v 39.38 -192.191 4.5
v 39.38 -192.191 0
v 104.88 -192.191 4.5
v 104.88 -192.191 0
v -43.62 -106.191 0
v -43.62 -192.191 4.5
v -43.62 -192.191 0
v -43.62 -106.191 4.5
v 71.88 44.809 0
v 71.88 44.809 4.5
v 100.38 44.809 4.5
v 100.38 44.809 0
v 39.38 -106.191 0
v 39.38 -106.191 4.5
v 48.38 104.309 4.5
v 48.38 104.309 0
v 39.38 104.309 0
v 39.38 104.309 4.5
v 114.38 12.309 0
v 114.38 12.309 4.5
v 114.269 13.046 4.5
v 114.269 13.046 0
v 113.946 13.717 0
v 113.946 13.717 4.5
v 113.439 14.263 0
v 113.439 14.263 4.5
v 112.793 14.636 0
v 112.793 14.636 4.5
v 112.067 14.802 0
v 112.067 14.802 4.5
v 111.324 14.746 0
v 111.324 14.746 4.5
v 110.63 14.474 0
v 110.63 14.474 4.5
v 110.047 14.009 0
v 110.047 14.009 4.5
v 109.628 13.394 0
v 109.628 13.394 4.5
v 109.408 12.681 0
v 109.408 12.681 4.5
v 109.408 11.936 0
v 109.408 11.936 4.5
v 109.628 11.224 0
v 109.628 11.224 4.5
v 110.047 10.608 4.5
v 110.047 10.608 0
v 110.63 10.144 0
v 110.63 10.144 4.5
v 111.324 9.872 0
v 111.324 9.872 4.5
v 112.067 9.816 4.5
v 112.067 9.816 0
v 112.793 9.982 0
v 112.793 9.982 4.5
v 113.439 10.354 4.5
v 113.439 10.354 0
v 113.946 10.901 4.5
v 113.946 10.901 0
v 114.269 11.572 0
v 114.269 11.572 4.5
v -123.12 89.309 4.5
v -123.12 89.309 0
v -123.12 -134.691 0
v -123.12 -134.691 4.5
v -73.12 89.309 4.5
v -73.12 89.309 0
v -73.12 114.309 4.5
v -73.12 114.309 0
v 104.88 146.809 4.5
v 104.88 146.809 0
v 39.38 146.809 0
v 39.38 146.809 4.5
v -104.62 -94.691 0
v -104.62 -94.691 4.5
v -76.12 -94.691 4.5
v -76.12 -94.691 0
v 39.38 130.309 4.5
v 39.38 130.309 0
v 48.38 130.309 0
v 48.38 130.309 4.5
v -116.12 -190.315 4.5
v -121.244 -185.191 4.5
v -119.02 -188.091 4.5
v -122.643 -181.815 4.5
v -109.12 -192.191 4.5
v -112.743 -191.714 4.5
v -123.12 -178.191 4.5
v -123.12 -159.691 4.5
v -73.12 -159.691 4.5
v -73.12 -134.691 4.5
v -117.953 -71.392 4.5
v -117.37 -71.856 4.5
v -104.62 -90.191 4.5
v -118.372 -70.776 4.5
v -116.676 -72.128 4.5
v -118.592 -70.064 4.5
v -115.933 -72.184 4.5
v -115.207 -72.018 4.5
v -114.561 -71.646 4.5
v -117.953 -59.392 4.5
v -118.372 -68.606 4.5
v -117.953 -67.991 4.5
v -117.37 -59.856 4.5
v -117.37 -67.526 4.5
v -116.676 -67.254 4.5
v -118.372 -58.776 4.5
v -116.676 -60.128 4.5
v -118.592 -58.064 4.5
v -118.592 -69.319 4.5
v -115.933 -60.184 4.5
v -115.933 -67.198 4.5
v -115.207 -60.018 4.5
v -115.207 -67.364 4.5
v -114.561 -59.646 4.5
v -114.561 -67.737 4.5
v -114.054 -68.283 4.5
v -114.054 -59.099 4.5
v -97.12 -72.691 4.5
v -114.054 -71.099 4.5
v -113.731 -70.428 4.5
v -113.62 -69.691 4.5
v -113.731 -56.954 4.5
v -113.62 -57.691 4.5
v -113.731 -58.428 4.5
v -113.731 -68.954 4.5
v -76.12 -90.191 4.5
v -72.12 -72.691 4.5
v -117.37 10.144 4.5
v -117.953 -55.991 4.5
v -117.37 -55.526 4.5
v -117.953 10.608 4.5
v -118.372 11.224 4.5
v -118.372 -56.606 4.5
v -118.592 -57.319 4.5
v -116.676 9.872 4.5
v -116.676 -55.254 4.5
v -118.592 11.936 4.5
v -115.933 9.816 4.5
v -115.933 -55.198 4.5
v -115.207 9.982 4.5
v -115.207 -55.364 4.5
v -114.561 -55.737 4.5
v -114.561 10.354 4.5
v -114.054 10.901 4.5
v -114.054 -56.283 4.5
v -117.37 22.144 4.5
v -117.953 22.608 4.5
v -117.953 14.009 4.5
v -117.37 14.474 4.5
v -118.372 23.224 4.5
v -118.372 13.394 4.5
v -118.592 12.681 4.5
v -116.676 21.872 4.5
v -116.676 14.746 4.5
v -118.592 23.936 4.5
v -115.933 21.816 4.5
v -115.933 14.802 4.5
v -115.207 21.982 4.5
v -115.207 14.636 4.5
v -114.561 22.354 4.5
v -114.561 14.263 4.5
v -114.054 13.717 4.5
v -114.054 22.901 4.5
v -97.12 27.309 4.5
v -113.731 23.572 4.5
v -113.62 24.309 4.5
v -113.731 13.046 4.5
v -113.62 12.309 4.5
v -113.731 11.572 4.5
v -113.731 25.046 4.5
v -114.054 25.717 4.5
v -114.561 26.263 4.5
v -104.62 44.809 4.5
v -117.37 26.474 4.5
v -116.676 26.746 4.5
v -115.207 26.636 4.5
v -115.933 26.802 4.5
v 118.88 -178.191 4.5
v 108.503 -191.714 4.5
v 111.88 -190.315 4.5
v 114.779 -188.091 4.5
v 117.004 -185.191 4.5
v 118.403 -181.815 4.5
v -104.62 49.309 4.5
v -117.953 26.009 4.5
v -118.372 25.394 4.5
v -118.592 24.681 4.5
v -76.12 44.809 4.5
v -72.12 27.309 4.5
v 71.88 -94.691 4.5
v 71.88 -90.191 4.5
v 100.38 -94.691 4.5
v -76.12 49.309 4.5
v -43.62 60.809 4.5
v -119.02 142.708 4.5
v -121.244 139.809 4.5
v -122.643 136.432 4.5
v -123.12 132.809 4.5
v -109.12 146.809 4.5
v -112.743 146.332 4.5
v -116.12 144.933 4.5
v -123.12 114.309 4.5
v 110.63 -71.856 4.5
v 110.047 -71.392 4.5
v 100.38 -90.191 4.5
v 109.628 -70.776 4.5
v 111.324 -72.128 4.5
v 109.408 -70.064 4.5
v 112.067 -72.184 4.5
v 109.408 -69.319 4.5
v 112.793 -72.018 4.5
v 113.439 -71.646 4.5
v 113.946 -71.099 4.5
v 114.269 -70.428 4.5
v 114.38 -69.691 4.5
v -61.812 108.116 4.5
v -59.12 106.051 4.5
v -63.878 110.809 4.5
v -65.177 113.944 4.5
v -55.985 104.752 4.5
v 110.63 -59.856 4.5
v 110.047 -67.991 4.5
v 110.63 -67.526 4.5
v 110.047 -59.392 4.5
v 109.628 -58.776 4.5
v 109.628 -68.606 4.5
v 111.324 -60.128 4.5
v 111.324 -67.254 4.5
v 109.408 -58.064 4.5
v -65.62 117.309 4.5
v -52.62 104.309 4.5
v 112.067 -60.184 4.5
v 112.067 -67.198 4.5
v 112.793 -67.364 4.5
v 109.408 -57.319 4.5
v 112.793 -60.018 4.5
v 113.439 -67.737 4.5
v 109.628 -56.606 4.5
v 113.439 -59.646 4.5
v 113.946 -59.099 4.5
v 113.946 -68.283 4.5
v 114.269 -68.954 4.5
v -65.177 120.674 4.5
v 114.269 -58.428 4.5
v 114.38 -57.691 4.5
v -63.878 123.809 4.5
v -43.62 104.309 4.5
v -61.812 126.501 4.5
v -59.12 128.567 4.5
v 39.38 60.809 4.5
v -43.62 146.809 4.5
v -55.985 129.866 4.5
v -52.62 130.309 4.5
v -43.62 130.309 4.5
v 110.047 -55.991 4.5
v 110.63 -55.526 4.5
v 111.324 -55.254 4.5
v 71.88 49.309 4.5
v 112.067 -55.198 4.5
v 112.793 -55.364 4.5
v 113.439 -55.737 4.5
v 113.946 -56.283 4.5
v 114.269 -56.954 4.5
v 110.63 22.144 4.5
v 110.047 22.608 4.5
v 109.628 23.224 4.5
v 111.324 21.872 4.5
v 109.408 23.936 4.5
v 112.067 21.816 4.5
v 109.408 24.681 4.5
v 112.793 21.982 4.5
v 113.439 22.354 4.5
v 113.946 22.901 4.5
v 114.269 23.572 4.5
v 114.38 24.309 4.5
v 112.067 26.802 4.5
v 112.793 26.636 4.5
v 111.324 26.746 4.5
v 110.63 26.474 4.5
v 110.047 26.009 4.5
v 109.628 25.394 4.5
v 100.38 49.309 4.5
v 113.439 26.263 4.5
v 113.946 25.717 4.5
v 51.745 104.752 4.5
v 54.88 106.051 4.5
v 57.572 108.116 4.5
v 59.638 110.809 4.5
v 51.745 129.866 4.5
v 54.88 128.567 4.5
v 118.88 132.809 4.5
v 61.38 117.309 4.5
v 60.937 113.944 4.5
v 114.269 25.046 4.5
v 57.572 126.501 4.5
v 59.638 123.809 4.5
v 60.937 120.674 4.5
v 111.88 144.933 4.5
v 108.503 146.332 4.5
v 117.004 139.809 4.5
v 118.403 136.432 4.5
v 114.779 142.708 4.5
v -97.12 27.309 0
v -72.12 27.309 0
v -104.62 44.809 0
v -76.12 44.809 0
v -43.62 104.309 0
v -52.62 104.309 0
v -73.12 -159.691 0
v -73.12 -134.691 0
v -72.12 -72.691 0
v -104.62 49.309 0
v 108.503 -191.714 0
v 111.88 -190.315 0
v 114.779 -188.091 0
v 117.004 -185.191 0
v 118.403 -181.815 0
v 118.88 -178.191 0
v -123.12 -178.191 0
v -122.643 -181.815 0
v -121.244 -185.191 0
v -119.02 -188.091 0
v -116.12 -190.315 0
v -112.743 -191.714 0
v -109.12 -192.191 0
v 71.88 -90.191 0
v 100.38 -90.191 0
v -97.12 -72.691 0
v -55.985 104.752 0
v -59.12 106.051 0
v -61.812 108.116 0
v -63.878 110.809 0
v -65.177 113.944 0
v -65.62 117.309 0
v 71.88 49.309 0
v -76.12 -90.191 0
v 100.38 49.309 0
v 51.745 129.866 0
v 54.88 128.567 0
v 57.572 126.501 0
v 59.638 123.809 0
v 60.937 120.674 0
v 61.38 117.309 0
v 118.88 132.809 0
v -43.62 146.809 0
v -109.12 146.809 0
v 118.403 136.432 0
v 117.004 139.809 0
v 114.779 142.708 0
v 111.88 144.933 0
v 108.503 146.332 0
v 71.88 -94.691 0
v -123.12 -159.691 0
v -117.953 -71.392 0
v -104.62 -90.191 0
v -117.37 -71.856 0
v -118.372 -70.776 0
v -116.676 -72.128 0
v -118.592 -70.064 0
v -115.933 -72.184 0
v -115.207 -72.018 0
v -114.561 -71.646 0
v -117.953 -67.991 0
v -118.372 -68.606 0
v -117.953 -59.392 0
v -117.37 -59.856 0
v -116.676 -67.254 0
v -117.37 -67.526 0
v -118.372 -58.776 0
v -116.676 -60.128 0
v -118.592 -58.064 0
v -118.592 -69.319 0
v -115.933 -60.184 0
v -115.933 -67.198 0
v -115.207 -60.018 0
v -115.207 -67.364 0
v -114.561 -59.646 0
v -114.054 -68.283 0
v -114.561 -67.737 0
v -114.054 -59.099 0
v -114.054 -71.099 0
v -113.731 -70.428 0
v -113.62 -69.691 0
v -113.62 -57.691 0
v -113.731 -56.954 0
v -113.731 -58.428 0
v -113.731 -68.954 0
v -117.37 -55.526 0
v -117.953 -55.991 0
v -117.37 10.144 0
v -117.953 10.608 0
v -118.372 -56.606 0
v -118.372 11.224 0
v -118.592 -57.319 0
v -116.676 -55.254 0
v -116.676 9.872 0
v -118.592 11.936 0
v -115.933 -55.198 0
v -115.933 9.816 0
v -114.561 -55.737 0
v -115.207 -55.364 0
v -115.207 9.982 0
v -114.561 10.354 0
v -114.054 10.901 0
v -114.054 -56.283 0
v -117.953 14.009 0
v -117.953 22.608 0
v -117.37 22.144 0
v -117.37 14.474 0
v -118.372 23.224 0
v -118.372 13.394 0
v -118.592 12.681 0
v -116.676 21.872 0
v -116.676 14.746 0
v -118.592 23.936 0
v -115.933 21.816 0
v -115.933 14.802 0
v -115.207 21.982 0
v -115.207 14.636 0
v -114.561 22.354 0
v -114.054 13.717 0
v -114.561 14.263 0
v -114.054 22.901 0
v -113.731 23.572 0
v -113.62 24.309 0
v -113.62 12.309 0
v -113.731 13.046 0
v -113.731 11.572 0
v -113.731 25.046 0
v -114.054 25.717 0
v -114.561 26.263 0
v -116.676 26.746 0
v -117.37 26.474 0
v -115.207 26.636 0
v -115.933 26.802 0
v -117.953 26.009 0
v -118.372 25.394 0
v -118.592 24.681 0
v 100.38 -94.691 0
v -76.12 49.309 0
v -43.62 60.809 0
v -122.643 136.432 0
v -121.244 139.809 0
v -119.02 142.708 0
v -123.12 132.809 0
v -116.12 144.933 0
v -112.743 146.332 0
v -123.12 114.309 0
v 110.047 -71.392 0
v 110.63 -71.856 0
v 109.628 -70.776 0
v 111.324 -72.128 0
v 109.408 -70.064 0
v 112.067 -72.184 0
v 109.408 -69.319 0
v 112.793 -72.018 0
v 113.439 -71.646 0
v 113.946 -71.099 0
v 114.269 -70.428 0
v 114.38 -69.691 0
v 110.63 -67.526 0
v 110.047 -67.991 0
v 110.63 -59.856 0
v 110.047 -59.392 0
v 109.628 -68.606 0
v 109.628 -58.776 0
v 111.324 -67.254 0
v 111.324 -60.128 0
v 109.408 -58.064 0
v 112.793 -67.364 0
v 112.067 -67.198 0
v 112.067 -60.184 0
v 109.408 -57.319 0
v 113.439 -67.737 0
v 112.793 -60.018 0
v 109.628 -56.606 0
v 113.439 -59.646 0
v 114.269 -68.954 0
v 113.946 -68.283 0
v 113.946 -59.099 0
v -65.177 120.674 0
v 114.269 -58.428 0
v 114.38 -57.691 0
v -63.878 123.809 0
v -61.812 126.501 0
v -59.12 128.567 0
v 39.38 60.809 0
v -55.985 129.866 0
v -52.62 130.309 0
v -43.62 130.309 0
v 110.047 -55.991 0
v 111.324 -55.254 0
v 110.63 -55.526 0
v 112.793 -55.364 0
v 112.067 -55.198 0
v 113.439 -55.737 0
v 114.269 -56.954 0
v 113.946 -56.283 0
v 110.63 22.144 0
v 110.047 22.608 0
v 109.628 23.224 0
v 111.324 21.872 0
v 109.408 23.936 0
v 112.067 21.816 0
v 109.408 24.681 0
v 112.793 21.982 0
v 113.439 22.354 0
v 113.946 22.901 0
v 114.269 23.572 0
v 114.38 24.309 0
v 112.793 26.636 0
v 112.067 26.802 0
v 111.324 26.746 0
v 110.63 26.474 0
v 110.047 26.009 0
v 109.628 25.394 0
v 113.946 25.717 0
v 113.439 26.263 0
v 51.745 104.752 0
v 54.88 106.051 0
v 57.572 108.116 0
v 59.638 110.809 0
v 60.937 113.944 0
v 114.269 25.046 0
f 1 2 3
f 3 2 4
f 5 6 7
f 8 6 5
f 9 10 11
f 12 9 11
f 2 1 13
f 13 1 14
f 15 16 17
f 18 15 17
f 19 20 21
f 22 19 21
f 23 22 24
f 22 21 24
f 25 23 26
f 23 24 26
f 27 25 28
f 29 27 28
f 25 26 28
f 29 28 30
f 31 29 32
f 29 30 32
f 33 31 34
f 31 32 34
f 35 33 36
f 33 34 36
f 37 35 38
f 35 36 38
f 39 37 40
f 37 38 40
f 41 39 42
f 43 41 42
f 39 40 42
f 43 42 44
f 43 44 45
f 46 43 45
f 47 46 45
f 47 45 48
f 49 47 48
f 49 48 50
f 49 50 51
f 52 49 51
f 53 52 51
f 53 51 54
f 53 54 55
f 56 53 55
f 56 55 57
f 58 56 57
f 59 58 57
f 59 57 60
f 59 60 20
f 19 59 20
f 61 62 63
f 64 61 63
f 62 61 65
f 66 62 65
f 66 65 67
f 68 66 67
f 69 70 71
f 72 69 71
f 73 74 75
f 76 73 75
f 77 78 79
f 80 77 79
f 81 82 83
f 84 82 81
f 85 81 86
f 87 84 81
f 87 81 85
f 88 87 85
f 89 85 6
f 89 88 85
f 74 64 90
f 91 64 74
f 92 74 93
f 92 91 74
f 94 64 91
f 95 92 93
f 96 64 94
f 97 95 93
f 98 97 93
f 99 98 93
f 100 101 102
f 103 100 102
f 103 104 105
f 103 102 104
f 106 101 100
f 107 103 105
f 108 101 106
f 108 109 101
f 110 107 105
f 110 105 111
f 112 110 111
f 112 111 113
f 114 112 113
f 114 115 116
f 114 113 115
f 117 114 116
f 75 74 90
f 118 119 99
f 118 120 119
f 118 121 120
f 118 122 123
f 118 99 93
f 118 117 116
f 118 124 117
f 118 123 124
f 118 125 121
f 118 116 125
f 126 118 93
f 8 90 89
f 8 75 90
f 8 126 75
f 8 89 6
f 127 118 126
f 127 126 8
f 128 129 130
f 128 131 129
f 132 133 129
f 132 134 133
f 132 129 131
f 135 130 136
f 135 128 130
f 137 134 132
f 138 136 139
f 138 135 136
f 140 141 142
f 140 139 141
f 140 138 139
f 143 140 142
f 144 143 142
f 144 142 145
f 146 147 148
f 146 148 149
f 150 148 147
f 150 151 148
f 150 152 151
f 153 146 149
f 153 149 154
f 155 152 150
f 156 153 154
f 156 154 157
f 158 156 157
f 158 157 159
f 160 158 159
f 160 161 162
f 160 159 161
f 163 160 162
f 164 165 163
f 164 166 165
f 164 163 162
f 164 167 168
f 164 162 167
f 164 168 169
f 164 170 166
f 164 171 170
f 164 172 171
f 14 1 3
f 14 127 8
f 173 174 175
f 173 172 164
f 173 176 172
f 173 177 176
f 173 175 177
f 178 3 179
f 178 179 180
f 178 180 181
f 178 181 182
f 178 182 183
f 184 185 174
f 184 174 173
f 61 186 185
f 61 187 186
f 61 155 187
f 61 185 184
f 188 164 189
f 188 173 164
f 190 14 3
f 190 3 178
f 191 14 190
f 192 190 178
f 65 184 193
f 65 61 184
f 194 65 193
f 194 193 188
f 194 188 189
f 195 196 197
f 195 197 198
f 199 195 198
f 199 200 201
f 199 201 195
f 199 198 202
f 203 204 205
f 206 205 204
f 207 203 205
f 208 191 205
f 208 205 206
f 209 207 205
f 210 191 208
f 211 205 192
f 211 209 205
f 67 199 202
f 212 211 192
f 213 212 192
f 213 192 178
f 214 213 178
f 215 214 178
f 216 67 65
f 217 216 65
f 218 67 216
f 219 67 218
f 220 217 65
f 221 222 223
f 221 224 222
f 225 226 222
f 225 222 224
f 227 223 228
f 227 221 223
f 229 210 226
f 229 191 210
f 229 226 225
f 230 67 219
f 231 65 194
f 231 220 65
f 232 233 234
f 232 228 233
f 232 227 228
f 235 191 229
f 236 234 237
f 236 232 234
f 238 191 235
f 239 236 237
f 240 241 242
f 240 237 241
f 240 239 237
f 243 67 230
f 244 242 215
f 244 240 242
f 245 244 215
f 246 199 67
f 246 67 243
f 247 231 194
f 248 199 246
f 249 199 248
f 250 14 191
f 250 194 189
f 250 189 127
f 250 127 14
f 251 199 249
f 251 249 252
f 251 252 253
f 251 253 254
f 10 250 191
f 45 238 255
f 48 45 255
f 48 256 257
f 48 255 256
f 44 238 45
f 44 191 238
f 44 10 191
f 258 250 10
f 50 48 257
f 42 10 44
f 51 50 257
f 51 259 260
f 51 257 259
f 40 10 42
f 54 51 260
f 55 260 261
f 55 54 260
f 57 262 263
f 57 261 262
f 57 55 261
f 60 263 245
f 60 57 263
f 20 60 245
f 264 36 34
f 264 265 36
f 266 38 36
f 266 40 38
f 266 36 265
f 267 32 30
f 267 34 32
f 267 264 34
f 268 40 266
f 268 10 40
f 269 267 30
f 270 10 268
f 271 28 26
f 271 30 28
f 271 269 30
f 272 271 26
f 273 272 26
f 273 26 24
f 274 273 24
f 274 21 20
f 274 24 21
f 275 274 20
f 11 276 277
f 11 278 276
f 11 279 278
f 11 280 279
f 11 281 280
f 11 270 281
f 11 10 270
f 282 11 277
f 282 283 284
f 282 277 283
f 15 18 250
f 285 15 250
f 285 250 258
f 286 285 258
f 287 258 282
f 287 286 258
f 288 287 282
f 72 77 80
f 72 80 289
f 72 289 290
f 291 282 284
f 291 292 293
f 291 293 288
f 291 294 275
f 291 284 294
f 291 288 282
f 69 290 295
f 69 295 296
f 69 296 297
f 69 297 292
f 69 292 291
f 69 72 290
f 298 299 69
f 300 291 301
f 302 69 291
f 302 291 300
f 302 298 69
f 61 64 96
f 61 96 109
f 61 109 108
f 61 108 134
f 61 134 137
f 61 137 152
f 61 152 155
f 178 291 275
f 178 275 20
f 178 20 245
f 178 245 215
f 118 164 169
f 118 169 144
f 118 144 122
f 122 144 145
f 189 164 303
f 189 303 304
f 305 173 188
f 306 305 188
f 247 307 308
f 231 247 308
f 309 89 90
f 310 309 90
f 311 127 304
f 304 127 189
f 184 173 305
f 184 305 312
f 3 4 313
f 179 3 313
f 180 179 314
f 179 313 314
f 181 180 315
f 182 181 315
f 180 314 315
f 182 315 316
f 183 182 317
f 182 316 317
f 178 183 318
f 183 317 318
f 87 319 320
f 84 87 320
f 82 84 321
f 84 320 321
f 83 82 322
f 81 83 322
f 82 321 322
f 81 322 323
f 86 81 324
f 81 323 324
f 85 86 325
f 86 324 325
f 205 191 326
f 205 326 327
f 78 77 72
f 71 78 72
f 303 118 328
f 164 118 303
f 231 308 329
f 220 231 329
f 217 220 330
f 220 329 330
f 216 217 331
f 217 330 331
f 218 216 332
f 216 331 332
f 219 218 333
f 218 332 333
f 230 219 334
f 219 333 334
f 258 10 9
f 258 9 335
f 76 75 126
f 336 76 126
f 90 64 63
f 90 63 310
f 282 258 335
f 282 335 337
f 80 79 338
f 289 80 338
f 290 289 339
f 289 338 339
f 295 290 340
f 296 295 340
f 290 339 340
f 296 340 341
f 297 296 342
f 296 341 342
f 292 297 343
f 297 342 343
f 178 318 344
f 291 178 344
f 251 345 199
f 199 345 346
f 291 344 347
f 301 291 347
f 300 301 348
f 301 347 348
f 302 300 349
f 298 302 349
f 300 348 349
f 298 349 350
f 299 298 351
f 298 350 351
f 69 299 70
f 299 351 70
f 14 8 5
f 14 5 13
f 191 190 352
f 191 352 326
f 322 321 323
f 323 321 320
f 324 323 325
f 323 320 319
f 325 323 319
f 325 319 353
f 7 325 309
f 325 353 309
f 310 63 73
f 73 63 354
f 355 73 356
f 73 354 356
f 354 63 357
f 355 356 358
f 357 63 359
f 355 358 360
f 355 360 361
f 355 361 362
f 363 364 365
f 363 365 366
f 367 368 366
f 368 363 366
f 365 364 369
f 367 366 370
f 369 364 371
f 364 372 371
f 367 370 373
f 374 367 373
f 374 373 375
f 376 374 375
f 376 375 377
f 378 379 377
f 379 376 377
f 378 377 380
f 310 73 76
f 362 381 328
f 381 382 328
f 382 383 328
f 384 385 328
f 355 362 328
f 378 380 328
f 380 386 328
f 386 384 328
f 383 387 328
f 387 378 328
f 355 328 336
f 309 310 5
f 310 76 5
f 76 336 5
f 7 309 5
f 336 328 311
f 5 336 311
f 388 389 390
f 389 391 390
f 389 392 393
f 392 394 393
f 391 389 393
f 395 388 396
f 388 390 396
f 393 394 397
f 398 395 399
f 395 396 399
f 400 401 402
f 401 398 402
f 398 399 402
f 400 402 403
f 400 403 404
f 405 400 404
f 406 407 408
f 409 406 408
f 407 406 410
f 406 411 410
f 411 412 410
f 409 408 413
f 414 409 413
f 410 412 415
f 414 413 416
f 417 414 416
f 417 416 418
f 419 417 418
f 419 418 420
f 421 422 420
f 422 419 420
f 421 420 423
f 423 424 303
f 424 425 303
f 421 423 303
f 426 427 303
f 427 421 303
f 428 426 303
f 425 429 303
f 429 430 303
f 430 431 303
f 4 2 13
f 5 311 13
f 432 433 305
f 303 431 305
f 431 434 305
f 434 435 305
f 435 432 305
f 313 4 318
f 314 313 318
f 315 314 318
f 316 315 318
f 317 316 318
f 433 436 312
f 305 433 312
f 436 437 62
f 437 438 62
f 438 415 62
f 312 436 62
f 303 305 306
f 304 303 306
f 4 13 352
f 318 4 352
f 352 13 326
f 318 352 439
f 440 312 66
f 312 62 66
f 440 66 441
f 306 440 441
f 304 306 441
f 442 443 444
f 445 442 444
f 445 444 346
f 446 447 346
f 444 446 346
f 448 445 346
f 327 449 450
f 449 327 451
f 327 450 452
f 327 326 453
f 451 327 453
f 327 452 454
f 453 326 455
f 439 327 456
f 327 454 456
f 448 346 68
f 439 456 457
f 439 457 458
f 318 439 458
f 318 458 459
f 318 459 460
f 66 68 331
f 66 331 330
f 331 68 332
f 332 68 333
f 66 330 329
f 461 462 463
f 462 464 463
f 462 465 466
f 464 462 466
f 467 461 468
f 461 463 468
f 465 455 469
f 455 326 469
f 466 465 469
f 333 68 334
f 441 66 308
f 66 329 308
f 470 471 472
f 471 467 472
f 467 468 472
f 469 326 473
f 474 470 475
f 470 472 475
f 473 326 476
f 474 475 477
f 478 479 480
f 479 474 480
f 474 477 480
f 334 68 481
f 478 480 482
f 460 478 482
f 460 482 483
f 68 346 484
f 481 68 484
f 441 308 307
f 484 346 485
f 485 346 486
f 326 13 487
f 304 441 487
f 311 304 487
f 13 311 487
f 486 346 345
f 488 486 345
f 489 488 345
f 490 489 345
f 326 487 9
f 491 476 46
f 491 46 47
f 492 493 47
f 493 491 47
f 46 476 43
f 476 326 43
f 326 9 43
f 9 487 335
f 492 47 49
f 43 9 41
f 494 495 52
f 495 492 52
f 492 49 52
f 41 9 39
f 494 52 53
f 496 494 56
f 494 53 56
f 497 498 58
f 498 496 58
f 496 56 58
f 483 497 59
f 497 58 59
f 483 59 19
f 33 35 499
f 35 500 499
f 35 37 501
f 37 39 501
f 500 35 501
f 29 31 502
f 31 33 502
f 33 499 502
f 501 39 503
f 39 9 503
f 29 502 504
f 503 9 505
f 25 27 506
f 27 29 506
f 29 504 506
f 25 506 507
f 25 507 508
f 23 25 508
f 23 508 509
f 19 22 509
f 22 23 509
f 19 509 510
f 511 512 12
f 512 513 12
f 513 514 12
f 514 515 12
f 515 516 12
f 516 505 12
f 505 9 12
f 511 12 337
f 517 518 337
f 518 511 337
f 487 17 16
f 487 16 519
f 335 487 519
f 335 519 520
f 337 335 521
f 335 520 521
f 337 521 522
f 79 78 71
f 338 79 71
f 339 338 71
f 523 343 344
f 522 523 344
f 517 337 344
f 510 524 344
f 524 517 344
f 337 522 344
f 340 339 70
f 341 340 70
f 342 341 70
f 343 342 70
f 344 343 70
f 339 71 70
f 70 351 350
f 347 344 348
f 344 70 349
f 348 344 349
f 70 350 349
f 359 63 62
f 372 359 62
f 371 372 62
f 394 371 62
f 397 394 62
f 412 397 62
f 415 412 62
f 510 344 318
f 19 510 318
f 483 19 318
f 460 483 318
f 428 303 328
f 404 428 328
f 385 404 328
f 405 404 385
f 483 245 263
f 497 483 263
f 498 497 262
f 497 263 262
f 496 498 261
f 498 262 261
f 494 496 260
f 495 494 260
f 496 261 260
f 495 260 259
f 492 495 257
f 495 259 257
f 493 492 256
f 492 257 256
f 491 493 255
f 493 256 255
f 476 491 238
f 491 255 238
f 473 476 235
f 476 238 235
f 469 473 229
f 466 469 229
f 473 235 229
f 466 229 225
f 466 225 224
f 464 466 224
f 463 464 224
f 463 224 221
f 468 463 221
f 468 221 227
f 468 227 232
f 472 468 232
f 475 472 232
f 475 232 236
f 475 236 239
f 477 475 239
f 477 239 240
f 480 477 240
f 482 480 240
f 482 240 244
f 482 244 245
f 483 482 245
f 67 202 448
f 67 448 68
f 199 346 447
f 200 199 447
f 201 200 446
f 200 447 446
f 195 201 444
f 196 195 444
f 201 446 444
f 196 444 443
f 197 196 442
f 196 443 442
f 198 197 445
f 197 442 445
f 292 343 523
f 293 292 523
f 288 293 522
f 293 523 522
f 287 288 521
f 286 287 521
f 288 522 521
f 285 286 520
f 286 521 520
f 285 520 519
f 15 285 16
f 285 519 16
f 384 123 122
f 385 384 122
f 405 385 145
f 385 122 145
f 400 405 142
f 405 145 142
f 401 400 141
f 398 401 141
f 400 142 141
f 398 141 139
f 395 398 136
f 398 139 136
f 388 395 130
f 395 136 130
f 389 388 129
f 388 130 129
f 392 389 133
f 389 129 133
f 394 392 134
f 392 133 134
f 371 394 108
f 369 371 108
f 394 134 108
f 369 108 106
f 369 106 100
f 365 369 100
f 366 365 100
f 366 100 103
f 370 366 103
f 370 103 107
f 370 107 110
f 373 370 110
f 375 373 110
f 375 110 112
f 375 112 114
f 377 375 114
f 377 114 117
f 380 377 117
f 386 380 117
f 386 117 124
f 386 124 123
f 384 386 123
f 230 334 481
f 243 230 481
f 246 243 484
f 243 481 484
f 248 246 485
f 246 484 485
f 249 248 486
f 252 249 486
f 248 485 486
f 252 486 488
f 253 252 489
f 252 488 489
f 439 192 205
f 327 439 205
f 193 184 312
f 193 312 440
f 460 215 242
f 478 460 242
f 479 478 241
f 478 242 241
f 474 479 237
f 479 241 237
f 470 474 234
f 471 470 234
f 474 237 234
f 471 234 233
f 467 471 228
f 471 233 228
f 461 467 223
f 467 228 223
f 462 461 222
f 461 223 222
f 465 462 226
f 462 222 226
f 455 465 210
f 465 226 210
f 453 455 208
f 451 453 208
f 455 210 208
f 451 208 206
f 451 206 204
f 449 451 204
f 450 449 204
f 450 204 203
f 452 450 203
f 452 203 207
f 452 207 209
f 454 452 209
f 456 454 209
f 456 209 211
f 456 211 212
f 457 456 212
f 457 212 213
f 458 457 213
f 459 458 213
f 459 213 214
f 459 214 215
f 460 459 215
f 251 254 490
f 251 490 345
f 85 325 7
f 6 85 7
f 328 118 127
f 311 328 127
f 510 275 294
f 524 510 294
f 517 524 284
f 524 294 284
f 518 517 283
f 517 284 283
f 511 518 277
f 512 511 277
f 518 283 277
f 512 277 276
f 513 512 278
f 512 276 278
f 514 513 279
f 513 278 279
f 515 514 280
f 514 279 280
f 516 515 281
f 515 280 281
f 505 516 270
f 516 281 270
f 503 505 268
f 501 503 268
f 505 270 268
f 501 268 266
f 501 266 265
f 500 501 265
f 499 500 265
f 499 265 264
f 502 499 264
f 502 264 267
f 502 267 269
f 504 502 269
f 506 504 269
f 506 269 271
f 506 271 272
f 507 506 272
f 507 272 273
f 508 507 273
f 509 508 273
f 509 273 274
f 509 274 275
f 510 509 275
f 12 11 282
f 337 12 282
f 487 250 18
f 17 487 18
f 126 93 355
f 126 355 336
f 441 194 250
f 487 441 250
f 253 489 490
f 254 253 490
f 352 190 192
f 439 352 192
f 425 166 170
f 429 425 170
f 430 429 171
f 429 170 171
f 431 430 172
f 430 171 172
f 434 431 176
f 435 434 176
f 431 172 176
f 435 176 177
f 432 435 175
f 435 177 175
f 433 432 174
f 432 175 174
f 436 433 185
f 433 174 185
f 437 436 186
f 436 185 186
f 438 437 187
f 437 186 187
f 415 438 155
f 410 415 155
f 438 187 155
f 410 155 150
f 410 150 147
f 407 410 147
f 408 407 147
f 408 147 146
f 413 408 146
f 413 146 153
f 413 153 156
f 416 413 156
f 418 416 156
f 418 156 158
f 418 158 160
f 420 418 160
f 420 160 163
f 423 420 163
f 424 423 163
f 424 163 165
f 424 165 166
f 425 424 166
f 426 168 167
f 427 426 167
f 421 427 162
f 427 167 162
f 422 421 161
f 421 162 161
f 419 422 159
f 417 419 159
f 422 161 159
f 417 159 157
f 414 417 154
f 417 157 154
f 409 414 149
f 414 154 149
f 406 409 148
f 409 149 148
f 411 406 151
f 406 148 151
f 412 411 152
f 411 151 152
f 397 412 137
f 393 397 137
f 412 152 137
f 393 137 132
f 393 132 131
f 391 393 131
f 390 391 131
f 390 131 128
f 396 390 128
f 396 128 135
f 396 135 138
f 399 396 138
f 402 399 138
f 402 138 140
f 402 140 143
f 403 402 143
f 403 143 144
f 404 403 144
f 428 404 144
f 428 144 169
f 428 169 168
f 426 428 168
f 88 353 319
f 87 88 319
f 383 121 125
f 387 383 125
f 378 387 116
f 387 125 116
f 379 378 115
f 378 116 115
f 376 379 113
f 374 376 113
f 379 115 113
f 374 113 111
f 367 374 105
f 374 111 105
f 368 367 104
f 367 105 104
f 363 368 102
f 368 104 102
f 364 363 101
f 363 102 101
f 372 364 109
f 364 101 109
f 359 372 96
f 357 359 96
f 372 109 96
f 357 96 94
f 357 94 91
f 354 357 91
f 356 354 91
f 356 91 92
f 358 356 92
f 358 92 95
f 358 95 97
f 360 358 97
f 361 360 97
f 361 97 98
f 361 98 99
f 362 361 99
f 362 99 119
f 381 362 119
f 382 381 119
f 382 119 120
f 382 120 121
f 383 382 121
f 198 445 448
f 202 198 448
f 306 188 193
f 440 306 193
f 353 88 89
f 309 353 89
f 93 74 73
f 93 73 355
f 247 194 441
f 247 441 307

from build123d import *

# Parameters (mm, degrees)
F1_DEPTH = 4.5
F2_W     = 28.5
F2_H     = 4.5
F2_R     = 2.5
F2_W_2   = 25
F2_H_2   = 100
F2_W_3   = 50
F2_H_3   = 25
F2_W_4   = 83
F2_H_4   = 86
F3_DEPTH = 25


with BuildPart() as f1:
    # F0 (on Top) → F1 (new body)
    with BuildSketch(Plane.XY):
        with BuildLine():
            Line((104.879995, 146.808884), (-109.120005, 146.808884))
            ThreePointArc((-109.120005, 146.808884), (-119.0195, 142.708379), (-123.120005, 132.808884))
            Line((-123.120005, 132.808884), (-123.120005, -178.191116))
            ThreePointArc((-123.120005, -178.191116), (-119.0195, -188.090611), (-109.120005, -192.191116))
            Line((-109.120005, -192.191116), (104.879995, -192.191116))
            ThreePointArc((104.879995, -192.191116), (114.77949, -188.090611), (118.879995, -178.191116))
            Line((118.879995, -178.191116), (118.879995, 132.808884))
            ThreePointArc((118.879995, 132.808884), (114.77949, 142.708379), (104.879995, 146.808884))
        make_face()
        with BuildLine():
            ThreePointArc((-65.620005, 117.308884), (-61.812393, 126.501272), (-52.620005, 130.308884))
            Line((-52.620005, 130.308884), (48.379995, 130.308884))
            ThreePointArc((48.379995, 130.308884), (57.572383, 126.501272), (61.379995, 117.308884))
            ThreePointArc((61.379995, 117.308884), (57.572383, 108.116496), (48.379995, 104.308884))
            Line((48.379995, 104.308884), (-52.620005, 104.308884))
            ThreePointArc((-52.620005, 104.308884), (-61.812393, 108.116496), (-65.620005, 117.308884))
        make_face(mode=Mode.SUBTRACT)
    extrude(amount=F1_DEPTH)

    # F2 (on face) → F3 (cut)
    with BuildSketch(Plane.XY.offset(4.5)):
        with Locations((-90.370005, 47.058884)):
            Rectangle(F2_W, F2_H)
        with Locations((-116.120005, 24.308884)):
            Circle(F2_R)
        with Locations((-116.120005, 12.308884)):
            Circle(F2_R)
        with Locations((-116.120005, -57.691116)):
            Circle(F2_R)
        with Locations((-116.120005, -69.691116)):
            Circle(F2_R)
        with Locations((-90.370005, -92.441116)):
            Rectangle(F2_W, F2_H)
        with Locations((86.129995, 47.058884)):
            Rectangle(F2_W, F2_H)
        with Locations((86.129995, -92.441116)):
            Rectangle(F2_W, F2_H)
        with Locations((111.879995, 24.308884)):
            Circle(F2_R)
        with Locations((111.879995, 12.308884)):
            Circle(F2_R)
        with Locations((111.879995, -57.691116)):
            Circle(F2_R)
        with Locations((111.879995, -69.691116)):
            Circle(F2_R)
        with Locations((-84.620005, -22.691116)):
            Rectangle(F2_W_2, F2_H_2)
        with Locations((-98.120005, 101.808884)):
            Rectangle(F2_W_3, F2_H_3)
        with Locations((-98.120005, -147.191116)):
            Rectangle(F2_W_3, F2_H_3)
        with Locations((-2.120005, 103.808884)):
            Rectangle(F2_W_4, F2_H_4)
        with Locations((-2.120005, -149.191116)):
            Rectangle(F2_W_4, F2_H_4)
    extrude(amount=-F3_DEPTH, mode=Mode.SUBTRACT)


solid = f1.part
